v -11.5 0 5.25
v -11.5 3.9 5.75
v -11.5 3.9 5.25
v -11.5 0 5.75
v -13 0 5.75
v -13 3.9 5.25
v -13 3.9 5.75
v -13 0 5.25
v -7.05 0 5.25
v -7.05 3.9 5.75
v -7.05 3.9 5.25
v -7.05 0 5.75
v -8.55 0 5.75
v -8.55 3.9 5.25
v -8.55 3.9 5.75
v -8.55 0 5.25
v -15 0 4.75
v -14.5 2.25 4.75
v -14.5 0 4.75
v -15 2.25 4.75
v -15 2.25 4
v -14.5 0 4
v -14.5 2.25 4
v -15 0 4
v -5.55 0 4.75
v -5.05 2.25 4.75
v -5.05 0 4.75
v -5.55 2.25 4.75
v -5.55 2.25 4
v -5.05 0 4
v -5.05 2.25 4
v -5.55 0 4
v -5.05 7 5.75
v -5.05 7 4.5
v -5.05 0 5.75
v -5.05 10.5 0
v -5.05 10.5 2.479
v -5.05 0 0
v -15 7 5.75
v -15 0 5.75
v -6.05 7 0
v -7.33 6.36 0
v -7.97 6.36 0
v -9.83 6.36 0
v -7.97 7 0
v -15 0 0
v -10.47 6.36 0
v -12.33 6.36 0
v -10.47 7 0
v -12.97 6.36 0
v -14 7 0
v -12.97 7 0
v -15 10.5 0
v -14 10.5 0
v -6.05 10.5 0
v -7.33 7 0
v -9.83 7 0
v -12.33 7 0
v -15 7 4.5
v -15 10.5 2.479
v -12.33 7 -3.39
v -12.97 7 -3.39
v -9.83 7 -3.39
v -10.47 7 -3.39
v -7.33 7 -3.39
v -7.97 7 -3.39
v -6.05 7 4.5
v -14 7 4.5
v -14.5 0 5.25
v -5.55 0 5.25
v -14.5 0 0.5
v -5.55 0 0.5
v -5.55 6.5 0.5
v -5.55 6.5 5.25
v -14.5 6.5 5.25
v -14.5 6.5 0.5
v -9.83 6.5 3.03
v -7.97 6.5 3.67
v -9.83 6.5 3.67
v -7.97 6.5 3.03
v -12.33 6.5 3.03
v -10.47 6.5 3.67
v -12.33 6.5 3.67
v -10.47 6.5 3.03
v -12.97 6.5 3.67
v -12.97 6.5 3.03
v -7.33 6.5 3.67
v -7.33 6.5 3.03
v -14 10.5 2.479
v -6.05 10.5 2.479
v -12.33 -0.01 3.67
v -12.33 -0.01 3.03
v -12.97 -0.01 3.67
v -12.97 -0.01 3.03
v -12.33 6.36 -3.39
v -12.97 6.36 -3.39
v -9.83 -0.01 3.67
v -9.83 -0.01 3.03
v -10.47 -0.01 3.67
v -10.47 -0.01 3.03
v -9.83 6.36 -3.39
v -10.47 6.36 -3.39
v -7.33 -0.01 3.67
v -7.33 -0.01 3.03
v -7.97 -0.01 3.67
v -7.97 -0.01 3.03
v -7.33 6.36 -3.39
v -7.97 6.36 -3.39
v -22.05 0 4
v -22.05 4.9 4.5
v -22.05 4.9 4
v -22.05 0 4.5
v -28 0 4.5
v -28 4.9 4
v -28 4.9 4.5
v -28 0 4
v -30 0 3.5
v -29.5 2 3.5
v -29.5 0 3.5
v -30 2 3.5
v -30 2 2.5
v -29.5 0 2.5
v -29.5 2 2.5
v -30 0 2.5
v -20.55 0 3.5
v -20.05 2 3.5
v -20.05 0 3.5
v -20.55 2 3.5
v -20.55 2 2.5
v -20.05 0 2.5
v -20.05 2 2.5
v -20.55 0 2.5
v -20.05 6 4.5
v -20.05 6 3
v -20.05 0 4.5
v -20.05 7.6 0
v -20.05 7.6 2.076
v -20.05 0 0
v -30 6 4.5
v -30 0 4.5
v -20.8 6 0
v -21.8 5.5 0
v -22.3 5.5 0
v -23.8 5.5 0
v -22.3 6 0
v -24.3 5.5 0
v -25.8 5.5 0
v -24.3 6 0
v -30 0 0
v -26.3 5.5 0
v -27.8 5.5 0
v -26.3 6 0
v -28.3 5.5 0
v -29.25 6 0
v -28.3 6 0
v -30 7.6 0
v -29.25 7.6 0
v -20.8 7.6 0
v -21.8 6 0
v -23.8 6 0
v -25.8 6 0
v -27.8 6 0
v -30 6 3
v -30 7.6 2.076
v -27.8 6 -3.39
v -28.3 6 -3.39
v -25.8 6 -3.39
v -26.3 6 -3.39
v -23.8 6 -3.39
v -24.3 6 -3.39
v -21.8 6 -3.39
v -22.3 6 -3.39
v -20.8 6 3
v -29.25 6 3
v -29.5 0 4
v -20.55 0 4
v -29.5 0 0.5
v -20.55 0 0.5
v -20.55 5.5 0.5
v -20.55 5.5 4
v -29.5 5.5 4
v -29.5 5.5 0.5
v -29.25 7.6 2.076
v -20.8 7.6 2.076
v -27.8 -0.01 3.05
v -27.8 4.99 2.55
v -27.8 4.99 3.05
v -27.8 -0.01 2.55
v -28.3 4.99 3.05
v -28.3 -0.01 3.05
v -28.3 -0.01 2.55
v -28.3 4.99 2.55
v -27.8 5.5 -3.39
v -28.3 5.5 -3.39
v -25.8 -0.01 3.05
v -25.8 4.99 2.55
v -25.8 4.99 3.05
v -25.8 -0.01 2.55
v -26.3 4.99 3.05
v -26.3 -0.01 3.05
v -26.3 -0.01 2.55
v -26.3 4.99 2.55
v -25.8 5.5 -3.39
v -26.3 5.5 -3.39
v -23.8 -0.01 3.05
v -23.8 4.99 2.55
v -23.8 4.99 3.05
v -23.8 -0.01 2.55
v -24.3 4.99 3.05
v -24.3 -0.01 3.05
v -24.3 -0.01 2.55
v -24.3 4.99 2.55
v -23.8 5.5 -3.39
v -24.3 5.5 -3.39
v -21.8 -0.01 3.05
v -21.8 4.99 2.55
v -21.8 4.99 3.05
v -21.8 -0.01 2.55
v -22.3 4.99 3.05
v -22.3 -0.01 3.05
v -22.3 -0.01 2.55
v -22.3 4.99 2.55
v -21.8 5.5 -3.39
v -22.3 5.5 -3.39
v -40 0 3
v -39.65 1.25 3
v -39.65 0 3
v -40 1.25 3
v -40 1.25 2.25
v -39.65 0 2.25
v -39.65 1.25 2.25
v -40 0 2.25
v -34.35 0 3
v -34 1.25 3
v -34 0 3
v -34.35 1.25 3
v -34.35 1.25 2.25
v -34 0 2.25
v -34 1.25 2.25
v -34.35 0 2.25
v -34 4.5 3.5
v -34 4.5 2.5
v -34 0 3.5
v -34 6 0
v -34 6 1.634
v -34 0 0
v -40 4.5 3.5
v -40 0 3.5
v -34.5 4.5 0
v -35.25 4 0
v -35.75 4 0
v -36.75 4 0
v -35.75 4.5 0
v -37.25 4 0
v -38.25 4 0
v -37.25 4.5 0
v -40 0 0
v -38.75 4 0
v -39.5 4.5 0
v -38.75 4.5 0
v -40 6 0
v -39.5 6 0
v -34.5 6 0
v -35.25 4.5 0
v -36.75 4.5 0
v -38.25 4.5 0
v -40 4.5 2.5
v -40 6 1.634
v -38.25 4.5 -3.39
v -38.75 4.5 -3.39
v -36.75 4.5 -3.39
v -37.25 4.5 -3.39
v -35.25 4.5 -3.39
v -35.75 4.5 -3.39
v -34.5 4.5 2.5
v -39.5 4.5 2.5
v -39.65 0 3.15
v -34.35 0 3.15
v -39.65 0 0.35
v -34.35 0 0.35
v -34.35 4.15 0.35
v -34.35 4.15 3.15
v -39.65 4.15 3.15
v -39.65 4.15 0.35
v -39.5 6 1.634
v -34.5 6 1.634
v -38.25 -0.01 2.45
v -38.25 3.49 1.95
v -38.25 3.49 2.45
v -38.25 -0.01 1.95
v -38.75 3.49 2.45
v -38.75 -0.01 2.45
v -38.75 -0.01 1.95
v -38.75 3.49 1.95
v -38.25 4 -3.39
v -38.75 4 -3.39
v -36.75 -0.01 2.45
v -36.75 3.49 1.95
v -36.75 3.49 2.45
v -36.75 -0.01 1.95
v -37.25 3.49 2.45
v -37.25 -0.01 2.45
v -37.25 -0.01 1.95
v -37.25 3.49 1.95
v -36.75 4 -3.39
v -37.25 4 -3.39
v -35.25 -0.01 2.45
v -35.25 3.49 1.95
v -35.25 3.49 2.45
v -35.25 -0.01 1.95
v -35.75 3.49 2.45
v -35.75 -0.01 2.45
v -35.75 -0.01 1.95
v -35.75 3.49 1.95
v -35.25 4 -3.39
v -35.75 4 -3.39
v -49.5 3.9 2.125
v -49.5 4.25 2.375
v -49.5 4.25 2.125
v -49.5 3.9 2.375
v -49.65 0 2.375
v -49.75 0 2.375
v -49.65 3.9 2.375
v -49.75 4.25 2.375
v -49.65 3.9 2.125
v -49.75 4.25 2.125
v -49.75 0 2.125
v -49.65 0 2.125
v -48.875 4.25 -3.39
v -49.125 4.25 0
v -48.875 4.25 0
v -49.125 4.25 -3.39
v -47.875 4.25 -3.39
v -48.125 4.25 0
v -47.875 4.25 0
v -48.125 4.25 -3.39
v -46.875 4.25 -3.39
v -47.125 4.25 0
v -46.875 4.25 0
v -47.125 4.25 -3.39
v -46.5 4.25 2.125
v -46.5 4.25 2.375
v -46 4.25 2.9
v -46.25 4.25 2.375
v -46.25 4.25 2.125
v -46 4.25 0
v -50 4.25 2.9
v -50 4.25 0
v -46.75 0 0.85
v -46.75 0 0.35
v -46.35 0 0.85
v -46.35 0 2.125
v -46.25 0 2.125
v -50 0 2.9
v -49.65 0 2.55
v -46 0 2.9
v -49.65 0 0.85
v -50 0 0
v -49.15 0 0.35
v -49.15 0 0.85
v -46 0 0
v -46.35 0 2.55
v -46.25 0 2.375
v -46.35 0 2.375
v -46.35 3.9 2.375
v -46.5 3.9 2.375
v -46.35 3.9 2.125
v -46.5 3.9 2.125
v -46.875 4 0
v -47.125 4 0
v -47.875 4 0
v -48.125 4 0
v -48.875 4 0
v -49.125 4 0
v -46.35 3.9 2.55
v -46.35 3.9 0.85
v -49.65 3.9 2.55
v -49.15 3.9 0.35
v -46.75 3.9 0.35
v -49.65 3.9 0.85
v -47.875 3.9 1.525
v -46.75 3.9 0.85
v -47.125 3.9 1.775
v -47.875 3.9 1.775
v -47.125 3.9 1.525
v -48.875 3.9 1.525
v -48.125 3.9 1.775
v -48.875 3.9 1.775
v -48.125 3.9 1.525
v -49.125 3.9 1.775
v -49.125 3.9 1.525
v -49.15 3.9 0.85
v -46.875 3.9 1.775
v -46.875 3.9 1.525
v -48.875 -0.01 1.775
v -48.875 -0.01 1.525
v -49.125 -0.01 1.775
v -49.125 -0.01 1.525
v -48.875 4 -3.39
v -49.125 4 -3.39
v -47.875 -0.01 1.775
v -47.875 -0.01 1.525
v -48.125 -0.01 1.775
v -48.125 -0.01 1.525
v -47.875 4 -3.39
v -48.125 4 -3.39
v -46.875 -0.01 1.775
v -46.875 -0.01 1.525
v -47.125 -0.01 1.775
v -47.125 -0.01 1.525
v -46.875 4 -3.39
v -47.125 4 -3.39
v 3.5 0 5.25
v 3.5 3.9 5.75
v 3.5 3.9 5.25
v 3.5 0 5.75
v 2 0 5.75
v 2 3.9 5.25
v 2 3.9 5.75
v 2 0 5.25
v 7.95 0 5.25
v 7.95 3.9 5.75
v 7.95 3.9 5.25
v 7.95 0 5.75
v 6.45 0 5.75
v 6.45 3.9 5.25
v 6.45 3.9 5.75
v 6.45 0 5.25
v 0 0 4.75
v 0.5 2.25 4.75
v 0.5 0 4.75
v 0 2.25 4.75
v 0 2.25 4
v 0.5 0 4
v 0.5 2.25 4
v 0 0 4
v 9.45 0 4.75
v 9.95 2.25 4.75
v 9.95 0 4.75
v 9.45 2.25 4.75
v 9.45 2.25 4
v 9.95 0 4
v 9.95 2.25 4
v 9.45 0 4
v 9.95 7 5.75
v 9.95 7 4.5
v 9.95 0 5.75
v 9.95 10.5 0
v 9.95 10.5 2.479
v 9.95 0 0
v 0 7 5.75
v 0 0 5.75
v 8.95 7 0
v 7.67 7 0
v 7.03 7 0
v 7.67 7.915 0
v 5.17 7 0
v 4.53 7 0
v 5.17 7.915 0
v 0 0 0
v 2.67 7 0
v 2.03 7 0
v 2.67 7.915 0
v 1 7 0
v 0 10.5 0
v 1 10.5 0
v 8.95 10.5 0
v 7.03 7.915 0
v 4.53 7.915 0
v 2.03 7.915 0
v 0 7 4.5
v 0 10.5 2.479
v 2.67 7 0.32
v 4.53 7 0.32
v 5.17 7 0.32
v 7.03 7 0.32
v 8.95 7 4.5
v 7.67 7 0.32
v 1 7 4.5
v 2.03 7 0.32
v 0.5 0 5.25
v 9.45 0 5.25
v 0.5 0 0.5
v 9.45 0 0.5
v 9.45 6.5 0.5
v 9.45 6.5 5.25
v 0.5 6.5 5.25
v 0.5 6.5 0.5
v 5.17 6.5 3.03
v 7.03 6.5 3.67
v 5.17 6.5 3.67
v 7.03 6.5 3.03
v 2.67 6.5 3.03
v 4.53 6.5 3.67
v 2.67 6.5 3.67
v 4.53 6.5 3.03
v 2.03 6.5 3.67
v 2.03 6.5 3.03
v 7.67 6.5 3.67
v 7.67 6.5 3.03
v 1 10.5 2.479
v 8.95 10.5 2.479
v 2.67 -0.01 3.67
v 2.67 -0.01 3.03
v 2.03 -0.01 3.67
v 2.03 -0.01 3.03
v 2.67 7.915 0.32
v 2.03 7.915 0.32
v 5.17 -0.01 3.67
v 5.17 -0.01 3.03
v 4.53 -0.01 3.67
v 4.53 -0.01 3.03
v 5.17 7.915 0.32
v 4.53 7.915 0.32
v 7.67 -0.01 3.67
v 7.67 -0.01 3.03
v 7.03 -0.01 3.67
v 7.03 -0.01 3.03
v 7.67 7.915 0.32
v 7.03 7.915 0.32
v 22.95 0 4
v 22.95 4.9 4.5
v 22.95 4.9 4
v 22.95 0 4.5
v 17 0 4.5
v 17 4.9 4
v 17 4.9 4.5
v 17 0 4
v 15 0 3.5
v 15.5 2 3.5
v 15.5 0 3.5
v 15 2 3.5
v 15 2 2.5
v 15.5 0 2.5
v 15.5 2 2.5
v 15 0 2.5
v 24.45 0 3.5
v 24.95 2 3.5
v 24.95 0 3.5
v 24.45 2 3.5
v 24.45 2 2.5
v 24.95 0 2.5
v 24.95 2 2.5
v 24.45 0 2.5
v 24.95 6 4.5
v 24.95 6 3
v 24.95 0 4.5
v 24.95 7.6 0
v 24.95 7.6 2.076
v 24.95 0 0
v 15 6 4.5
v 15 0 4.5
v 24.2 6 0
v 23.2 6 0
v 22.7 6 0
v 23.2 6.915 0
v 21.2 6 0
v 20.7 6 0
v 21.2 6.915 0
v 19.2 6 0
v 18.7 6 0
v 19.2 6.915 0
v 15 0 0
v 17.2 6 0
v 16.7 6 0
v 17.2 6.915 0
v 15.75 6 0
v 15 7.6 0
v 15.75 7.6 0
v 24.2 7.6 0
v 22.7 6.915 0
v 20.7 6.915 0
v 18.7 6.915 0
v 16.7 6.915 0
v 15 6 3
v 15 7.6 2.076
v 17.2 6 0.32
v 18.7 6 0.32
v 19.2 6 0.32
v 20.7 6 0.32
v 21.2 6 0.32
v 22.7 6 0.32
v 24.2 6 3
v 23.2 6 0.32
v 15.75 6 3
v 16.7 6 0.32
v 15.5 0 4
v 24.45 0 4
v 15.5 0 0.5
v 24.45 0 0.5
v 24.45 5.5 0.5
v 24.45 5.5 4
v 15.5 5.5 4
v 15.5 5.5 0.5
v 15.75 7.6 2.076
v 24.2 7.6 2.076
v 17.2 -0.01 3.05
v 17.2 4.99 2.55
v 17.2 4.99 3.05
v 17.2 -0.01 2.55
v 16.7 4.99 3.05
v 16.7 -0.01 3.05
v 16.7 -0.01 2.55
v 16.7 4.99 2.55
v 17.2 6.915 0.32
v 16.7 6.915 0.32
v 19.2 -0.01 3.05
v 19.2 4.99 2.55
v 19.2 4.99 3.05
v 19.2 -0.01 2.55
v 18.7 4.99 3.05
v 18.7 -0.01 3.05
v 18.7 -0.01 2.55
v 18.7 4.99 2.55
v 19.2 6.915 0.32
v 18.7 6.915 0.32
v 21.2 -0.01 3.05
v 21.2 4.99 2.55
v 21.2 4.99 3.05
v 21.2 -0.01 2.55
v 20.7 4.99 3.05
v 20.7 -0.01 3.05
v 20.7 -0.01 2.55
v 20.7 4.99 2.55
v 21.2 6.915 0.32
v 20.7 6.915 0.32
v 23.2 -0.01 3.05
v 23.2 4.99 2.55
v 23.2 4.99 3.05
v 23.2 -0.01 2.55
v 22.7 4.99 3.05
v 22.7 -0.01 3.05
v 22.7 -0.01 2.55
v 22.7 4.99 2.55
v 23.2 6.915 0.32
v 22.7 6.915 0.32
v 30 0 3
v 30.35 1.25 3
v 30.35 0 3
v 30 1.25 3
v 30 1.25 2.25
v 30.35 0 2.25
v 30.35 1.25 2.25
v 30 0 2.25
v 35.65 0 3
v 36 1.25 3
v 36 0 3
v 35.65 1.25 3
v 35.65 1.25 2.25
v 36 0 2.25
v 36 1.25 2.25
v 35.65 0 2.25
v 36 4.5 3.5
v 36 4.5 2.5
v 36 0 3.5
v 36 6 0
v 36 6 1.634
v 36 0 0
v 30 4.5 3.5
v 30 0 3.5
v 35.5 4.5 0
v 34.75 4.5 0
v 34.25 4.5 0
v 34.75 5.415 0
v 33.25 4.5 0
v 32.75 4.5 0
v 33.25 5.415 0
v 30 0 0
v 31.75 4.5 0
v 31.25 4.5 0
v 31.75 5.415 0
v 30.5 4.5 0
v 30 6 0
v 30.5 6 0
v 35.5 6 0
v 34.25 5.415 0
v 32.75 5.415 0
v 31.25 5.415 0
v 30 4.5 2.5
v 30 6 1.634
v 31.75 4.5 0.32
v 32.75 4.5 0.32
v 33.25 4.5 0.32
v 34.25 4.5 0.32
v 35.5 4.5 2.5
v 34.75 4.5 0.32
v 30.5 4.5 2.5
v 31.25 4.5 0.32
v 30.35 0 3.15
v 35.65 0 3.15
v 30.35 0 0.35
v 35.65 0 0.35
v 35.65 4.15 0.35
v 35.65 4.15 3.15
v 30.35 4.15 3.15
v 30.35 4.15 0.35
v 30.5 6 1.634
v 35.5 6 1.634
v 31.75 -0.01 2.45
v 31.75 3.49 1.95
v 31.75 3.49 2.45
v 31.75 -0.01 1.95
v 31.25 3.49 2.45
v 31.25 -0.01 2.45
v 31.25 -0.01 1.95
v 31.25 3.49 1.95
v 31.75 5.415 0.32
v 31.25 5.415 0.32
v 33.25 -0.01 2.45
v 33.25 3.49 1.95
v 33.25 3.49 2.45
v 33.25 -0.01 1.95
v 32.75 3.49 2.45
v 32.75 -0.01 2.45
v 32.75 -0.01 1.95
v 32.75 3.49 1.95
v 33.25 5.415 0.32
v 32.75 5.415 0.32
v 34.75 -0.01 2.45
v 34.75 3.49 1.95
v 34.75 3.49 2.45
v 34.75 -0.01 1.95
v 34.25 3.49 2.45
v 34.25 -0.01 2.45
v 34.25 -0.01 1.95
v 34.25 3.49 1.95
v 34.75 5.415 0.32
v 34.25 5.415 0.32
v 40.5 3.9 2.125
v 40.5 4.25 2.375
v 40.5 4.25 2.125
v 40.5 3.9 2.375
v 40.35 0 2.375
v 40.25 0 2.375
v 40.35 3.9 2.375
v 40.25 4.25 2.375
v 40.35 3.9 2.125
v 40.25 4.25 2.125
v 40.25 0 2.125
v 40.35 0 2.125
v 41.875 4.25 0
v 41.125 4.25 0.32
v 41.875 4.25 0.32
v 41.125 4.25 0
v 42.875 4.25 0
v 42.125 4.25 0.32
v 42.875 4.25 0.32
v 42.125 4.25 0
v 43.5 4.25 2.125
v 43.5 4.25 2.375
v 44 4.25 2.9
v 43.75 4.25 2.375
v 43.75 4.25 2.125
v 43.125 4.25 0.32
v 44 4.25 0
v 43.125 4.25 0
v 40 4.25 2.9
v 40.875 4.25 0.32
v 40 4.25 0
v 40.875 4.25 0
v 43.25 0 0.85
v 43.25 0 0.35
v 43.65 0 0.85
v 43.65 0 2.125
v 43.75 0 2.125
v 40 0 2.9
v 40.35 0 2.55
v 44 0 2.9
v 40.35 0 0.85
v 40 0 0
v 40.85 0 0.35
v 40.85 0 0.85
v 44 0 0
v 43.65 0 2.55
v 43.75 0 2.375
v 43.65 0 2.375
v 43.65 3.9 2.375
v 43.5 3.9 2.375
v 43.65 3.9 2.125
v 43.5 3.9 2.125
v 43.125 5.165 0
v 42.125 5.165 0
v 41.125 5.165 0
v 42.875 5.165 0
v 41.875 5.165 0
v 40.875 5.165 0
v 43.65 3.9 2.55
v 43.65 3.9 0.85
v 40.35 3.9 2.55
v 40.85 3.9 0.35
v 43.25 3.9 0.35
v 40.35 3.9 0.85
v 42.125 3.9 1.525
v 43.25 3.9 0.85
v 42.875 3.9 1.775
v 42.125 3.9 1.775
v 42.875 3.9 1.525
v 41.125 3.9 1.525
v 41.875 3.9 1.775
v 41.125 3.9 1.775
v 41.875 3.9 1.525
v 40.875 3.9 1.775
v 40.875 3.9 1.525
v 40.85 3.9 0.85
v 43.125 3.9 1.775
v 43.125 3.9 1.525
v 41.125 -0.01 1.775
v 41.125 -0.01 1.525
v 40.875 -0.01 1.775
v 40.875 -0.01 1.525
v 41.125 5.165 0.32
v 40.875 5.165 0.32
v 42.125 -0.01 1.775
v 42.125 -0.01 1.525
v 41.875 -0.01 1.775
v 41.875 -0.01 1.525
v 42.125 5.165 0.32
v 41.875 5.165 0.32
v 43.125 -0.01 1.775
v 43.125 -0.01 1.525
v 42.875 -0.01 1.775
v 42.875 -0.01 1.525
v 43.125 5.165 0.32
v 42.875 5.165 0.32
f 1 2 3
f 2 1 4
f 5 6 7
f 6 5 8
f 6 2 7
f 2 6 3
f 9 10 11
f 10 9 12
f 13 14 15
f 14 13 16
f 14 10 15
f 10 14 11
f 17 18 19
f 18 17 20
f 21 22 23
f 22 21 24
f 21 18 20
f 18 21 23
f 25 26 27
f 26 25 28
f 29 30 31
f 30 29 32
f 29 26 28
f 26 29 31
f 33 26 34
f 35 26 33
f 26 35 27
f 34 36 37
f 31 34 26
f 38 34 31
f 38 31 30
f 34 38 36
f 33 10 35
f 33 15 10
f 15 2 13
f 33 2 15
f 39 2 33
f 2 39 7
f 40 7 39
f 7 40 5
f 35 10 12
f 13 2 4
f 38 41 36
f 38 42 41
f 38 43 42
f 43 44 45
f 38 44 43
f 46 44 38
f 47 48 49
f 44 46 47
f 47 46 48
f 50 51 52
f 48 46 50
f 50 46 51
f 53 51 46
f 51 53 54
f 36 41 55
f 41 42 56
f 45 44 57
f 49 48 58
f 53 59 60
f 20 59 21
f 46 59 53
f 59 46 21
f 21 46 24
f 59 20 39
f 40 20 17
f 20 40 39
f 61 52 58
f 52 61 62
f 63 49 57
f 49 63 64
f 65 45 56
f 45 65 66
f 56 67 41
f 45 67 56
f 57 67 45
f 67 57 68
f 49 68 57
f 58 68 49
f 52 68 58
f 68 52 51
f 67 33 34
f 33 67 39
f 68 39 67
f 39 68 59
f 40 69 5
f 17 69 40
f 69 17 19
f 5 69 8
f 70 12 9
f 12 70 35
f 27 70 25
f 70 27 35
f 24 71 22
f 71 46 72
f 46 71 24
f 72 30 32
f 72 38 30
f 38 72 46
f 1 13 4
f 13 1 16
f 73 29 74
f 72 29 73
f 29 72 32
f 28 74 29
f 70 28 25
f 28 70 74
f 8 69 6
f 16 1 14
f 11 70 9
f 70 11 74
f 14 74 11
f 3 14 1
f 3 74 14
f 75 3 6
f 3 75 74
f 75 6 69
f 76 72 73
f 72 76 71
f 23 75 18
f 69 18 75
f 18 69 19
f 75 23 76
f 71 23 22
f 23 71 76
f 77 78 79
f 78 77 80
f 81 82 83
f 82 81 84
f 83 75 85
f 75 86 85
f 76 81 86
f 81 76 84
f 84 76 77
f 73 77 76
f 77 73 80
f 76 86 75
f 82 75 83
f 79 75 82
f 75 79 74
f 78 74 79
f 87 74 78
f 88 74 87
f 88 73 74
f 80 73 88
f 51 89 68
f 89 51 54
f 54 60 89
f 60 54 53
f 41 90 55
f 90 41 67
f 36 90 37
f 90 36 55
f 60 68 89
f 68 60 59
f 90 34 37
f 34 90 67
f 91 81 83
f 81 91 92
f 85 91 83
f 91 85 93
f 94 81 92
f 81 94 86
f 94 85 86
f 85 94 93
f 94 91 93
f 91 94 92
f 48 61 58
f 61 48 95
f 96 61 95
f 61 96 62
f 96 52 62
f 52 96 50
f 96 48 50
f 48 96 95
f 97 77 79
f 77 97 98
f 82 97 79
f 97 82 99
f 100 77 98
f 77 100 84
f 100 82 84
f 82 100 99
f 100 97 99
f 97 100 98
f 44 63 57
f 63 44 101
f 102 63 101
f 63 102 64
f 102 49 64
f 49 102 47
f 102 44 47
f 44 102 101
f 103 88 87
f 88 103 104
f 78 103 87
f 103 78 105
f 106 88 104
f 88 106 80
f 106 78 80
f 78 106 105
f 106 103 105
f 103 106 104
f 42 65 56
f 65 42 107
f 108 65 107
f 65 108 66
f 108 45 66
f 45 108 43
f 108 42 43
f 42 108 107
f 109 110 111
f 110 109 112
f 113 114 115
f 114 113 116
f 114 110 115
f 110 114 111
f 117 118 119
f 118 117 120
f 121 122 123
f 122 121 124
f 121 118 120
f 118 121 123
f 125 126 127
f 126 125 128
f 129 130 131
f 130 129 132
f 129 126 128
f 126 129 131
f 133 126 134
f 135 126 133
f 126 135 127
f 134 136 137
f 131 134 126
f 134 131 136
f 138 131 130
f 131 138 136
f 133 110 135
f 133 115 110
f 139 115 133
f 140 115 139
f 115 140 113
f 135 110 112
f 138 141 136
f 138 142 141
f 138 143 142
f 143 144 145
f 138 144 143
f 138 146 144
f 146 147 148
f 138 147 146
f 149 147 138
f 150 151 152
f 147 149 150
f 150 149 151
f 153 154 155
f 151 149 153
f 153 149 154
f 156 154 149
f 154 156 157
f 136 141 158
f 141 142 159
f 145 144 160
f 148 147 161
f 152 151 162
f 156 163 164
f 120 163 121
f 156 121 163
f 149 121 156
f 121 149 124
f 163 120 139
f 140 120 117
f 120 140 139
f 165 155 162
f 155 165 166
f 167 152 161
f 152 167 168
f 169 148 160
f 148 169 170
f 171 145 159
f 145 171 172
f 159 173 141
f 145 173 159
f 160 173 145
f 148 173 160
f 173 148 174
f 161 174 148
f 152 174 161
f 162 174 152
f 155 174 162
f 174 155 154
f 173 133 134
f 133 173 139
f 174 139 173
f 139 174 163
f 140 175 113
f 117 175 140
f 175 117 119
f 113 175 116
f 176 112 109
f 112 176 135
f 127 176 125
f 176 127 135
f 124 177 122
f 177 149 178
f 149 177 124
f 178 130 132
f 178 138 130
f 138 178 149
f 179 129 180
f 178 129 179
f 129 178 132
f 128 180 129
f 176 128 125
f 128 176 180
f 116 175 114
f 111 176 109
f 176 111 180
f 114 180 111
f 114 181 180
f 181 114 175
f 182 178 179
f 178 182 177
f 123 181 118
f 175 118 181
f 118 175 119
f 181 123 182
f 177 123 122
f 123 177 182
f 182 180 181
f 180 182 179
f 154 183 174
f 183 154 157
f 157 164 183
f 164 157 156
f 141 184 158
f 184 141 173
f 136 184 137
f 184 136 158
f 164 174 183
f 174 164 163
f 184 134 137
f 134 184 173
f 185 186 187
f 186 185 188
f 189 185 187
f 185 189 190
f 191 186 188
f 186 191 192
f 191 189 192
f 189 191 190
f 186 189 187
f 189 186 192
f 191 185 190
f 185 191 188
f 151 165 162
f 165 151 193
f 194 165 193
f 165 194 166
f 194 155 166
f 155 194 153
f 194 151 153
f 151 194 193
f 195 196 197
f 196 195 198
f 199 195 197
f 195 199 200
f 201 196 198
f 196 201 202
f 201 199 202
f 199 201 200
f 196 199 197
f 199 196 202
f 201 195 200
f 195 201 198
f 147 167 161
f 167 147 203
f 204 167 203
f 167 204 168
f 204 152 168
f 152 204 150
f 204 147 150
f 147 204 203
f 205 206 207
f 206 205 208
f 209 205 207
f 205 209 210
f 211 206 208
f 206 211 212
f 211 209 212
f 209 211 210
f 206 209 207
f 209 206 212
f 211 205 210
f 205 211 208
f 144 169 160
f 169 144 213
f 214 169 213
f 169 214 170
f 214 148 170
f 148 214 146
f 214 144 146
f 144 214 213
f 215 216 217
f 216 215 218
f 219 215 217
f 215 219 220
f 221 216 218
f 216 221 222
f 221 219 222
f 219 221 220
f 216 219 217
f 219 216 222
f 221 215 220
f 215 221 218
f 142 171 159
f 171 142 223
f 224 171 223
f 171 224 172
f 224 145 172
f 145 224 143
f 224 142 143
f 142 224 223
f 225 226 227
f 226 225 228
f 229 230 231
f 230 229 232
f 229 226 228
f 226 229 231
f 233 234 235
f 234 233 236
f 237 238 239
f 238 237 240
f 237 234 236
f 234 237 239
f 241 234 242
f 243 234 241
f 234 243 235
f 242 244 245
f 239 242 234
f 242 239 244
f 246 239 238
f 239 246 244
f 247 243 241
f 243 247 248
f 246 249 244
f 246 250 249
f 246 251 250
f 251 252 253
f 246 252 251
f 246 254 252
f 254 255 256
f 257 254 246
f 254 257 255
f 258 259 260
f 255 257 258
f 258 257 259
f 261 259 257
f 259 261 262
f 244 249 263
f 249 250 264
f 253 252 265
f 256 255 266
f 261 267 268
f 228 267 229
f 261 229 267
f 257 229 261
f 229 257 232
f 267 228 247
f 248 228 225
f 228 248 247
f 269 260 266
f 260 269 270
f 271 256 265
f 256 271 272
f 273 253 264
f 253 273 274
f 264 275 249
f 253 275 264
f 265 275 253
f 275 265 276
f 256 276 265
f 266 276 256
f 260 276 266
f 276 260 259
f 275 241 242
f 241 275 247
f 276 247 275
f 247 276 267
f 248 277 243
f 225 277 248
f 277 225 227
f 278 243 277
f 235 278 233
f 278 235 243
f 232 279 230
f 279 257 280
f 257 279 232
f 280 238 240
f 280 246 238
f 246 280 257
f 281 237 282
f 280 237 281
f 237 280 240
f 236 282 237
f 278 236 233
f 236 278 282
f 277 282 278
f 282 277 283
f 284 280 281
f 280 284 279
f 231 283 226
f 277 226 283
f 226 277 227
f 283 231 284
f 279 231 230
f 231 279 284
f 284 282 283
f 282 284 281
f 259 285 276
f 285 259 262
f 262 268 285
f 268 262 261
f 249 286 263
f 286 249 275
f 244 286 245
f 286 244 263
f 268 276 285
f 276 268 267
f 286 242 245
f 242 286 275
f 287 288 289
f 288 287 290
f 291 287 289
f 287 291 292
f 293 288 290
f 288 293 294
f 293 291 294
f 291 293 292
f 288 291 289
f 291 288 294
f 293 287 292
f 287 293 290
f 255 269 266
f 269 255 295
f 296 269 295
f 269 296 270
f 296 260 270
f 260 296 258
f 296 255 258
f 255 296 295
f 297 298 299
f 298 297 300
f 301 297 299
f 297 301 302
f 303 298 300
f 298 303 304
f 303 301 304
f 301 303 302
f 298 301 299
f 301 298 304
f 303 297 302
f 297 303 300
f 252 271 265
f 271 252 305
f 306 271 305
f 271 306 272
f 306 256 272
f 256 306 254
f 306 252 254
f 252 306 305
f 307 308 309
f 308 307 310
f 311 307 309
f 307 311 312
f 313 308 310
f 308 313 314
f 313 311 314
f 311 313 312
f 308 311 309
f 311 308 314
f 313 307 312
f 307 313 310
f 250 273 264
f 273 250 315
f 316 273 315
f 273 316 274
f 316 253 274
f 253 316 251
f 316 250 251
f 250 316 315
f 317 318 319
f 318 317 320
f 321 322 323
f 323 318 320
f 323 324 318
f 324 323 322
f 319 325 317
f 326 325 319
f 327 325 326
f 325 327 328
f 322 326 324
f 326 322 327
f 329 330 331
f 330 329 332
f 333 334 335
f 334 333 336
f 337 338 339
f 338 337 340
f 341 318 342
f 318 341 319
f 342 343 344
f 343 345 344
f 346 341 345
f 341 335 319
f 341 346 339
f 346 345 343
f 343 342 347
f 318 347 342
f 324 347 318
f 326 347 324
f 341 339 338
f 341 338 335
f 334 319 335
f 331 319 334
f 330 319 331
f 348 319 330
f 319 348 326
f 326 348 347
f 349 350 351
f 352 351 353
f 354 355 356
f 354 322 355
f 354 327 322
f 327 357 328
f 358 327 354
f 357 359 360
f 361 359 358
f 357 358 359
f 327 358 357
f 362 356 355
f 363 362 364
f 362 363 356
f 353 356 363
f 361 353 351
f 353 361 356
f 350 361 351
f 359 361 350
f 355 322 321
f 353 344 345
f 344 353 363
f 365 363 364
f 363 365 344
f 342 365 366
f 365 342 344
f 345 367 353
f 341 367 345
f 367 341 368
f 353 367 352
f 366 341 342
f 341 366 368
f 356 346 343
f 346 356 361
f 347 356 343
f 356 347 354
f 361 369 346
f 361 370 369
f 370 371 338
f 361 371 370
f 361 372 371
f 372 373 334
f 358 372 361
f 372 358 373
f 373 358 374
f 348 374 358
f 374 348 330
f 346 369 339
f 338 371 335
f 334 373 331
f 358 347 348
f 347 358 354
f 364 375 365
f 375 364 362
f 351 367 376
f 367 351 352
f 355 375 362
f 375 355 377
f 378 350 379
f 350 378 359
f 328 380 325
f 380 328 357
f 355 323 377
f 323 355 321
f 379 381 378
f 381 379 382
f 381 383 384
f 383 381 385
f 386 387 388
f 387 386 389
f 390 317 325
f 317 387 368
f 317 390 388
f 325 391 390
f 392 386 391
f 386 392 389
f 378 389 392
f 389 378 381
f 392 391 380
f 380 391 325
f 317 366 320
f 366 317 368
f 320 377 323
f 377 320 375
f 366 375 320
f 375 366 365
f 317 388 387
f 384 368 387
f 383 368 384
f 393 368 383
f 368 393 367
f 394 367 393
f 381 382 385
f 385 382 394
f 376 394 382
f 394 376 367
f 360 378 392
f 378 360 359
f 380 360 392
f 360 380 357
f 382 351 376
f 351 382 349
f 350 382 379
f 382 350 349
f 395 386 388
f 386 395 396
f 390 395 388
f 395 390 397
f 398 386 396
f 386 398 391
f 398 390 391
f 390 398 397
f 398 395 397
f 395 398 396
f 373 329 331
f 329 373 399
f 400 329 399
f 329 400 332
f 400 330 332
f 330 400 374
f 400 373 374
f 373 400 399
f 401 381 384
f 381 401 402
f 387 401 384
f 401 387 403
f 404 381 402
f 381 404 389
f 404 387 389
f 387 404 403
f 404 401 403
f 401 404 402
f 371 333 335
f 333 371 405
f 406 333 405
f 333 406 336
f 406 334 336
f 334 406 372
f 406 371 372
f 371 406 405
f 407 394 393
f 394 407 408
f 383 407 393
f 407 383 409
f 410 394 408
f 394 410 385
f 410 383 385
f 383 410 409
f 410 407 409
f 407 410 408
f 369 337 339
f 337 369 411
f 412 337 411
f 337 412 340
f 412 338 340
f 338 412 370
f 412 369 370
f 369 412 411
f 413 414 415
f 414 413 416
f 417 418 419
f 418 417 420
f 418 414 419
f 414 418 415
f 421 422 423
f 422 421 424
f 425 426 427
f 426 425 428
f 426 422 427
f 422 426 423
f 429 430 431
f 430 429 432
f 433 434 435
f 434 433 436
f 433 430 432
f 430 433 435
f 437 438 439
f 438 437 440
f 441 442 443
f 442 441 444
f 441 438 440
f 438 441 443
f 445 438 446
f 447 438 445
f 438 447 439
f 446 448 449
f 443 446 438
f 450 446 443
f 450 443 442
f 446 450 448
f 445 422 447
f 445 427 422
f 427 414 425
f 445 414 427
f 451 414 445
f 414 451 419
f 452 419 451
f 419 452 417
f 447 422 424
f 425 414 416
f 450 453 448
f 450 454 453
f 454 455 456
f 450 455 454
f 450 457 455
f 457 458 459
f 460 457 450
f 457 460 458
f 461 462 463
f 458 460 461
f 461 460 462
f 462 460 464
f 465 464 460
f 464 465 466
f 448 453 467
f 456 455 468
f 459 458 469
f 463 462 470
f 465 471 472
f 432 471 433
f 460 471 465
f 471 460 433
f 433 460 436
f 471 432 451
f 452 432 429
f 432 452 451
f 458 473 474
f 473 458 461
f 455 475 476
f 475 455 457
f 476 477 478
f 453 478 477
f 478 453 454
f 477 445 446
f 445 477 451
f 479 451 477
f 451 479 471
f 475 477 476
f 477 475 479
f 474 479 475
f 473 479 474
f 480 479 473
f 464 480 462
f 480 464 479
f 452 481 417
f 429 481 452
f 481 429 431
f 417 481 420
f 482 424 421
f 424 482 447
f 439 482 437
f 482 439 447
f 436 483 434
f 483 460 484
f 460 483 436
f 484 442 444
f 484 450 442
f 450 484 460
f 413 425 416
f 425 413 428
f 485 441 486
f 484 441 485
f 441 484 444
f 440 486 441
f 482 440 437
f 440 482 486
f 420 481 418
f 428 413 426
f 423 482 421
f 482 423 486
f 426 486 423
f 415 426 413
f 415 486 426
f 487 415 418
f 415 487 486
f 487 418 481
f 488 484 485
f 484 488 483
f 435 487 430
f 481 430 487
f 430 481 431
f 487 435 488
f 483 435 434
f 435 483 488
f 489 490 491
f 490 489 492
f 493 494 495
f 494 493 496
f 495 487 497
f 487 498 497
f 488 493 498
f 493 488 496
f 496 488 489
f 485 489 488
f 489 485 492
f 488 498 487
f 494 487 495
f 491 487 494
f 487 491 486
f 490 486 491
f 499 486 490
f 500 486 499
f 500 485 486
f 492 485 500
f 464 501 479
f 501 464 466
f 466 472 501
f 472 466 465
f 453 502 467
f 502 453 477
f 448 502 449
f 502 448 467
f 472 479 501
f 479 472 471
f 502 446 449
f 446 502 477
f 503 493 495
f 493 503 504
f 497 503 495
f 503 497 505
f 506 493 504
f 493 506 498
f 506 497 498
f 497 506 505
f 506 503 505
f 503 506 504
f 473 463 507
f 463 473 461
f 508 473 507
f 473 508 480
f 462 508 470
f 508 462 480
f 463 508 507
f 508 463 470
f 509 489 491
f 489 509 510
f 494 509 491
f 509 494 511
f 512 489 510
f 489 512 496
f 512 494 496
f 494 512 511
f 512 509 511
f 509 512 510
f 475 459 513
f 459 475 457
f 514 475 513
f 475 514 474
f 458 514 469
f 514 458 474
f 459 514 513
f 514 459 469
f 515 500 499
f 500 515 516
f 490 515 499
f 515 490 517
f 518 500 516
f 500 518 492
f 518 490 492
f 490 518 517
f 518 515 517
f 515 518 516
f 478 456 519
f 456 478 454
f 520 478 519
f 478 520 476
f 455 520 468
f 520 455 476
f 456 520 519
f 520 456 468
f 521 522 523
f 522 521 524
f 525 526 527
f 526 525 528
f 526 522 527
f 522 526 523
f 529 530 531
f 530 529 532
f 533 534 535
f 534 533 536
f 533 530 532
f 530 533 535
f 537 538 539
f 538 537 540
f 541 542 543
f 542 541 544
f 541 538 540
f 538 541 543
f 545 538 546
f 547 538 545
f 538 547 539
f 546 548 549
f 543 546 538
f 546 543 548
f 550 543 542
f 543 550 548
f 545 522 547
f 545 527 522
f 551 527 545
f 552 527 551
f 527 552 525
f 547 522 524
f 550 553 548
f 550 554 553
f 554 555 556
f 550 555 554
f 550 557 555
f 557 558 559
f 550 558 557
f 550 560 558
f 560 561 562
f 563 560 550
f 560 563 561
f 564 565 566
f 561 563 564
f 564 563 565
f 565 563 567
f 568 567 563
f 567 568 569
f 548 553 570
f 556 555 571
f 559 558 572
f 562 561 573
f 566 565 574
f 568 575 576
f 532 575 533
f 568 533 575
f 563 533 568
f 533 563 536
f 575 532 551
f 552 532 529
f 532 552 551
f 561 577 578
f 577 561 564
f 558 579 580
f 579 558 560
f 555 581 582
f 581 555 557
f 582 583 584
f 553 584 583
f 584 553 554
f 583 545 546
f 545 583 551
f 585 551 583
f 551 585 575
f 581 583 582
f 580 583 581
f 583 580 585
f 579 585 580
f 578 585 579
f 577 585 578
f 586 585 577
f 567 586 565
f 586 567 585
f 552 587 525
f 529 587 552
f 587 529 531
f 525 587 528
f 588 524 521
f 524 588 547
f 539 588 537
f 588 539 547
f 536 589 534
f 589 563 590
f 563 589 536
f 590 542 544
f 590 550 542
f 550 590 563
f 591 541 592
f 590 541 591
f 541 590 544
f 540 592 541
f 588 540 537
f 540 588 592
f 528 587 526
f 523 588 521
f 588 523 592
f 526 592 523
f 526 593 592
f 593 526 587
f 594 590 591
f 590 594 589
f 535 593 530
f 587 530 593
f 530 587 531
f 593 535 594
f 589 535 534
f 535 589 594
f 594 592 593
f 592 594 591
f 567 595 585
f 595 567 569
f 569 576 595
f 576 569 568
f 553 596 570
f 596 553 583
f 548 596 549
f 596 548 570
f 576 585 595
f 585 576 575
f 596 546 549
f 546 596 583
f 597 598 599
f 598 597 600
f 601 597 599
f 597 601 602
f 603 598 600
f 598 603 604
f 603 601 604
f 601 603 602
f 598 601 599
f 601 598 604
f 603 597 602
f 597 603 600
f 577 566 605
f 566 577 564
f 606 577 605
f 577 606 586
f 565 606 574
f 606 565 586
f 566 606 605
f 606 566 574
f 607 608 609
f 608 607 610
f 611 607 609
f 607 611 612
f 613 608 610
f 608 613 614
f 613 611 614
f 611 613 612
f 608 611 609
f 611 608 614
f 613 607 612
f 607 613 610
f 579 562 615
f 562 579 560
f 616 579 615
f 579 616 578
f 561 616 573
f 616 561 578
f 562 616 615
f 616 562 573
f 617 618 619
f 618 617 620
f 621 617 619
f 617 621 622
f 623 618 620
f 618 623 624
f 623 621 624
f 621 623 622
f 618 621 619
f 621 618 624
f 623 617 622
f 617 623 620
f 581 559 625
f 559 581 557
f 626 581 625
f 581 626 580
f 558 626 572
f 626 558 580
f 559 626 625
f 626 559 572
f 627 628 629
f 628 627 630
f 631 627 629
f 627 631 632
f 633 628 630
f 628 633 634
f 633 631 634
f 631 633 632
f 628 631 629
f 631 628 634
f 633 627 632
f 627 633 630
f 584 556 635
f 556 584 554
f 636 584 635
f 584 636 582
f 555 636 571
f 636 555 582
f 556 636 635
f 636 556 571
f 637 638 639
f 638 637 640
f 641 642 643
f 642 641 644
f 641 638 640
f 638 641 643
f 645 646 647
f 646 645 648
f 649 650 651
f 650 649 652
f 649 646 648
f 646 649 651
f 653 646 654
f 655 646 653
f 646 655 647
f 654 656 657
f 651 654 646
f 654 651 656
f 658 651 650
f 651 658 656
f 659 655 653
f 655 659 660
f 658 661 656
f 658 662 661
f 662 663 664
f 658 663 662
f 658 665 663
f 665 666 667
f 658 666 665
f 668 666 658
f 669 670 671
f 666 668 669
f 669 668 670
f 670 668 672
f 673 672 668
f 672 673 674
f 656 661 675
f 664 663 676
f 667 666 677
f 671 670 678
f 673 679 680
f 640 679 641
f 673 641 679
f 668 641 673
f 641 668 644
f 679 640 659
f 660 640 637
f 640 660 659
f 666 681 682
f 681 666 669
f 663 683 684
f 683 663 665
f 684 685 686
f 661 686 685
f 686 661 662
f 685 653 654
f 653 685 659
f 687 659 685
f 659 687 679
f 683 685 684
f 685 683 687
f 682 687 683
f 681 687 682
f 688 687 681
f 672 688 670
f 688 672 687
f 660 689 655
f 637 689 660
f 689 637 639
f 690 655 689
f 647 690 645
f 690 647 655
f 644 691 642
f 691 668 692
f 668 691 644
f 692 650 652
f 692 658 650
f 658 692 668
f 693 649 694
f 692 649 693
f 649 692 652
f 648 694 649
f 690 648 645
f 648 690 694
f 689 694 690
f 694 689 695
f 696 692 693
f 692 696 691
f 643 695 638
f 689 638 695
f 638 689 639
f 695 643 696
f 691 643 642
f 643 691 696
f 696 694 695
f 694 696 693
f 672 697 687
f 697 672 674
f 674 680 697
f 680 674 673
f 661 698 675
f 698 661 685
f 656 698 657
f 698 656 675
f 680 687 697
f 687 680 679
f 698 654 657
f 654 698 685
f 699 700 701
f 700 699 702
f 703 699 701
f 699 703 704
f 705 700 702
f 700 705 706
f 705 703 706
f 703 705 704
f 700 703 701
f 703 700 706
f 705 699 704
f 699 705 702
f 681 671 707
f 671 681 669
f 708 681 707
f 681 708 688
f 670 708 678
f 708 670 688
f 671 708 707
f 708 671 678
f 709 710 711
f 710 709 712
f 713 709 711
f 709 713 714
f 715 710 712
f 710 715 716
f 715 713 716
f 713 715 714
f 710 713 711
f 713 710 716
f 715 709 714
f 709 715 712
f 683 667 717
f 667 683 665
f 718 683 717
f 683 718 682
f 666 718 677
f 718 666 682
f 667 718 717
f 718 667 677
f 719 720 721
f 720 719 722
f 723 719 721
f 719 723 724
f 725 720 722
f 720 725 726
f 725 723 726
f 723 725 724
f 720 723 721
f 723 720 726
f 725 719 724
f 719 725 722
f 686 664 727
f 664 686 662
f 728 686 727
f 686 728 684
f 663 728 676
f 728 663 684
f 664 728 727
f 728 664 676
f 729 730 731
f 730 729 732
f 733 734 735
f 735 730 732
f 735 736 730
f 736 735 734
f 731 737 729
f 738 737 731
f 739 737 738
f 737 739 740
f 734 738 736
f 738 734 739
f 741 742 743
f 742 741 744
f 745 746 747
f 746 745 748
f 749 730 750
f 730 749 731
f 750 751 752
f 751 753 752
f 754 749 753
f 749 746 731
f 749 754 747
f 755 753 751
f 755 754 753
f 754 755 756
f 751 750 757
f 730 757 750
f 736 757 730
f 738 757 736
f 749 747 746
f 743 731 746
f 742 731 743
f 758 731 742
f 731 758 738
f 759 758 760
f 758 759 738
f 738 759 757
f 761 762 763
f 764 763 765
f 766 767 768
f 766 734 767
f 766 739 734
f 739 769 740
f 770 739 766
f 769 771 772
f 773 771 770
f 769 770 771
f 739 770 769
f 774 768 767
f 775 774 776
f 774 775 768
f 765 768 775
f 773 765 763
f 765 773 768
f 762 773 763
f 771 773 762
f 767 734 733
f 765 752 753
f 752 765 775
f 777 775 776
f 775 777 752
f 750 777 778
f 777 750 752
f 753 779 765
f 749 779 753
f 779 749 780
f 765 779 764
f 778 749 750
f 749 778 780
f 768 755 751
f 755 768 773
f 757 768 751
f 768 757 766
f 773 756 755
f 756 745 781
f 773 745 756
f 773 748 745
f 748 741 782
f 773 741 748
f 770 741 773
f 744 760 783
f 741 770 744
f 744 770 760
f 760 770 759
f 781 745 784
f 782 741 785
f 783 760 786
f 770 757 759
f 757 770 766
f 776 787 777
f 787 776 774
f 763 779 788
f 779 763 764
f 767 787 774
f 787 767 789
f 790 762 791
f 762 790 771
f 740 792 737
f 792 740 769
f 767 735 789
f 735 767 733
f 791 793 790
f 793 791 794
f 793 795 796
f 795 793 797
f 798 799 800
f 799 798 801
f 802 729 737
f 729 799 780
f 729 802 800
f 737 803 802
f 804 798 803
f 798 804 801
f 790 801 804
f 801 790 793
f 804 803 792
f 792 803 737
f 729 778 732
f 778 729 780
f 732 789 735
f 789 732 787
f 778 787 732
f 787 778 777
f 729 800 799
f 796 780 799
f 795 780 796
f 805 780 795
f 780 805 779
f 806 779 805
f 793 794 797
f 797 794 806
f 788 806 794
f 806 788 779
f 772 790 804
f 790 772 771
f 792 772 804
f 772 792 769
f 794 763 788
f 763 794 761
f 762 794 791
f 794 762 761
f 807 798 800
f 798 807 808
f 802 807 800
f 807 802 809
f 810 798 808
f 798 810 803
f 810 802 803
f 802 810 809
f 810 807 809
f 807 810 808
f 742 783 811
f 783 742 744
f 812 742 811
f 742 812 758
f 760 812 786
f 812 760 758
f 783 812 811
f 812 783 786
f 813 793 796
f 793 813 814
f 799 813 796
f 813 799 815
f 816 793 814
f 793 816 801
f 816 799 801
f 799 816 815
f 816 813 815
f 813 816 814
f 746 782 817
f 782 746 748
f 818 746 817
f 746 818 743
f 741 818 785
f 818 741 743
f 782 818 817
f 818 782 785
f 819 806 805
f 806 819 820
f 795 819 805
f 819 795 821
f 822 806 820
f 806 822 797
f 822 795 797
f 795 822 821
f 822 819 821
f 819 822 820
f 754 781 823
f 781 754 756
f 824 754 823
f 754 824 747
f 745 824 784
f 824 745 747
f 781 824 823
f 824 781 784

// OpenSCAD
/*
    This file is part of SBC Model Framework https://github.com/hominoids/SBC_Model_Framework
    Copyright 2016,2017,2018,2019,2020,2021,2022 Edward A. Kisiel hominoid@cablemi.com

    This program is free software: you can redistribute it and/or modify
    it under the terms of the GNU General Public License as published by
    the Free Software Foundation, either version 3 of the License, or
    (at your option) any later version.

    but WITHOUT ANY WARRANTY; without even the implied warranty of
    MERCHANTABILITY or FITNESS FOR A PARTICULAR PURPOSE.  See the
    GNU General Public License for more details.

    You should have received a copy of the GNU General Public License
    along with this program.  If not, see <http://www.gnu.org/licenses/>.
    Code released under GPLv3: http://www.gnu.org/licenses/gpl.html


*/

include <./lib/place.scad>
include <./lib/soc.scad>
include <./lib/antenna.scad>
include <./lib/audio.scad>
include <./lib/battery.scad>
include <./lib/button.scad>
include <./lib/cm.scad>
include <./lib/discrete.scad>
include <./lib/display.scad>
include <./lib/fan.scad>
include <./lib/gpio.scad>
include <./lib/header.scad>
include <./lib/heatsink.scad>
include <./lib/ic.scad>
include <./lib/jst.scad>
include <./lib/jumper.scad>
include <./lib/memory.scad>
include <./lib/network.scad>
include <./lib/pad.scad>
include <./lib/pcb.scad>
include <./lib/pcie.scad>
include <./lib/pillar.scad>
include <./lib/power.scad>
include <./lib/shape.scad>
include <./lib/smd.scad>
include <./lib/storage.scad>
include <./lib/switch.scad>
include <./lib/terminal.scad>
include <./lib/usb.scad>
include <./lib/video.scad>
